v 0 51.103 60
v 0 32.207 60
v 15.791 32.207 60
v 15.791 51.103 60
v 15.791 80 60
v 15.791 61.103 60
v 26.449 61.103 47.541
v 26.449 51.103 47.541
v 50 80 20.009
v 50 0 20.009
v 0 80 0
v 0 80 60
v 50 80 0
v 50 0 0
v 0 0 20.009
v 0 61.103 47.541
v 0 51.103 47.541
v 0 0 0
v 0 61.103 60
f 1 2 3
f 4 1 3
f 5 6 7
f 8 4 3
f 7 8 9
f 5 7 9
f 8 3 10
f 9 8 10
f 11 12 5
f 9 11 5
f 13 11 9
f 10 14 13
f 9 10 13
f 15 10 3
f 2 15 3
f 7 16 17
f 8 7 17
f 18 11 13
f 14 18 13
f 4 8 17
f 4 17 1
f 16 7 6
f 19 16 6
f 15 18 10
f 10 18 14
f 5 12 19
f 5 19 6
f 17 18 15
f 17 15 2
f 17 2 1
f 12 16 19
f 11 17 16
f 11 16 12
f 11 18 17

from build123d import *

# Parameters (mm, degrees)
F0_W     = 50
F0_H     = 80
F1_DEPTH = 60
F3_DEPTH = 80.001
F6_DEPTH = 66.156149
F7_W     = 5
F7_H     = 12.45938
F8_DEPTH = 43.57978


with BuildPart() as f1:
    # F0 (on Top) → F1 (new body)
    with BuildSketch(Plane.XY):
        with Locations((25, 40)):
            Rectangle(F0_W, F0_H)
    extrude(amount=F1_DEPTH)

    # F2 (on face) → F3 (cut, through all)
    with BuildSketch(Plane.XZ):
        Polygon((50, 20.009331), (50, 60), (15.790775, 60), align=None)
    extrude(amount=-F3_DEPTH, mode=Mode.SUBTRACT)

    # F5 (on offset) → F6 (cut)
    with BuildSketch(Plane.YZ.offset(50)):
        Polygon((0, 65.009331), (0, 20.009331), (36.240832, 65.009331), align=None)
    extrude(amount=-F6_DEPTH, mode=Mode.SUBTRACT)

    # F7 (on face) → F8 (cut)
    with BuildSketch(Plane(origin=(0, 0, 0), x_dir=(0, -1, 0), z_dir=(-1, 0, 0))):
        with Locations((-53.603279, 53.77031)):
            Rectangle(F7_W, F7_H)
        with Locations((-58.603279, 53.77031)):
            Rectangle(F7_W, F7_H)
    extrude(amount=-F8_DEPTH, mode=Mode.SUBTRACT)


solid = f1.part
